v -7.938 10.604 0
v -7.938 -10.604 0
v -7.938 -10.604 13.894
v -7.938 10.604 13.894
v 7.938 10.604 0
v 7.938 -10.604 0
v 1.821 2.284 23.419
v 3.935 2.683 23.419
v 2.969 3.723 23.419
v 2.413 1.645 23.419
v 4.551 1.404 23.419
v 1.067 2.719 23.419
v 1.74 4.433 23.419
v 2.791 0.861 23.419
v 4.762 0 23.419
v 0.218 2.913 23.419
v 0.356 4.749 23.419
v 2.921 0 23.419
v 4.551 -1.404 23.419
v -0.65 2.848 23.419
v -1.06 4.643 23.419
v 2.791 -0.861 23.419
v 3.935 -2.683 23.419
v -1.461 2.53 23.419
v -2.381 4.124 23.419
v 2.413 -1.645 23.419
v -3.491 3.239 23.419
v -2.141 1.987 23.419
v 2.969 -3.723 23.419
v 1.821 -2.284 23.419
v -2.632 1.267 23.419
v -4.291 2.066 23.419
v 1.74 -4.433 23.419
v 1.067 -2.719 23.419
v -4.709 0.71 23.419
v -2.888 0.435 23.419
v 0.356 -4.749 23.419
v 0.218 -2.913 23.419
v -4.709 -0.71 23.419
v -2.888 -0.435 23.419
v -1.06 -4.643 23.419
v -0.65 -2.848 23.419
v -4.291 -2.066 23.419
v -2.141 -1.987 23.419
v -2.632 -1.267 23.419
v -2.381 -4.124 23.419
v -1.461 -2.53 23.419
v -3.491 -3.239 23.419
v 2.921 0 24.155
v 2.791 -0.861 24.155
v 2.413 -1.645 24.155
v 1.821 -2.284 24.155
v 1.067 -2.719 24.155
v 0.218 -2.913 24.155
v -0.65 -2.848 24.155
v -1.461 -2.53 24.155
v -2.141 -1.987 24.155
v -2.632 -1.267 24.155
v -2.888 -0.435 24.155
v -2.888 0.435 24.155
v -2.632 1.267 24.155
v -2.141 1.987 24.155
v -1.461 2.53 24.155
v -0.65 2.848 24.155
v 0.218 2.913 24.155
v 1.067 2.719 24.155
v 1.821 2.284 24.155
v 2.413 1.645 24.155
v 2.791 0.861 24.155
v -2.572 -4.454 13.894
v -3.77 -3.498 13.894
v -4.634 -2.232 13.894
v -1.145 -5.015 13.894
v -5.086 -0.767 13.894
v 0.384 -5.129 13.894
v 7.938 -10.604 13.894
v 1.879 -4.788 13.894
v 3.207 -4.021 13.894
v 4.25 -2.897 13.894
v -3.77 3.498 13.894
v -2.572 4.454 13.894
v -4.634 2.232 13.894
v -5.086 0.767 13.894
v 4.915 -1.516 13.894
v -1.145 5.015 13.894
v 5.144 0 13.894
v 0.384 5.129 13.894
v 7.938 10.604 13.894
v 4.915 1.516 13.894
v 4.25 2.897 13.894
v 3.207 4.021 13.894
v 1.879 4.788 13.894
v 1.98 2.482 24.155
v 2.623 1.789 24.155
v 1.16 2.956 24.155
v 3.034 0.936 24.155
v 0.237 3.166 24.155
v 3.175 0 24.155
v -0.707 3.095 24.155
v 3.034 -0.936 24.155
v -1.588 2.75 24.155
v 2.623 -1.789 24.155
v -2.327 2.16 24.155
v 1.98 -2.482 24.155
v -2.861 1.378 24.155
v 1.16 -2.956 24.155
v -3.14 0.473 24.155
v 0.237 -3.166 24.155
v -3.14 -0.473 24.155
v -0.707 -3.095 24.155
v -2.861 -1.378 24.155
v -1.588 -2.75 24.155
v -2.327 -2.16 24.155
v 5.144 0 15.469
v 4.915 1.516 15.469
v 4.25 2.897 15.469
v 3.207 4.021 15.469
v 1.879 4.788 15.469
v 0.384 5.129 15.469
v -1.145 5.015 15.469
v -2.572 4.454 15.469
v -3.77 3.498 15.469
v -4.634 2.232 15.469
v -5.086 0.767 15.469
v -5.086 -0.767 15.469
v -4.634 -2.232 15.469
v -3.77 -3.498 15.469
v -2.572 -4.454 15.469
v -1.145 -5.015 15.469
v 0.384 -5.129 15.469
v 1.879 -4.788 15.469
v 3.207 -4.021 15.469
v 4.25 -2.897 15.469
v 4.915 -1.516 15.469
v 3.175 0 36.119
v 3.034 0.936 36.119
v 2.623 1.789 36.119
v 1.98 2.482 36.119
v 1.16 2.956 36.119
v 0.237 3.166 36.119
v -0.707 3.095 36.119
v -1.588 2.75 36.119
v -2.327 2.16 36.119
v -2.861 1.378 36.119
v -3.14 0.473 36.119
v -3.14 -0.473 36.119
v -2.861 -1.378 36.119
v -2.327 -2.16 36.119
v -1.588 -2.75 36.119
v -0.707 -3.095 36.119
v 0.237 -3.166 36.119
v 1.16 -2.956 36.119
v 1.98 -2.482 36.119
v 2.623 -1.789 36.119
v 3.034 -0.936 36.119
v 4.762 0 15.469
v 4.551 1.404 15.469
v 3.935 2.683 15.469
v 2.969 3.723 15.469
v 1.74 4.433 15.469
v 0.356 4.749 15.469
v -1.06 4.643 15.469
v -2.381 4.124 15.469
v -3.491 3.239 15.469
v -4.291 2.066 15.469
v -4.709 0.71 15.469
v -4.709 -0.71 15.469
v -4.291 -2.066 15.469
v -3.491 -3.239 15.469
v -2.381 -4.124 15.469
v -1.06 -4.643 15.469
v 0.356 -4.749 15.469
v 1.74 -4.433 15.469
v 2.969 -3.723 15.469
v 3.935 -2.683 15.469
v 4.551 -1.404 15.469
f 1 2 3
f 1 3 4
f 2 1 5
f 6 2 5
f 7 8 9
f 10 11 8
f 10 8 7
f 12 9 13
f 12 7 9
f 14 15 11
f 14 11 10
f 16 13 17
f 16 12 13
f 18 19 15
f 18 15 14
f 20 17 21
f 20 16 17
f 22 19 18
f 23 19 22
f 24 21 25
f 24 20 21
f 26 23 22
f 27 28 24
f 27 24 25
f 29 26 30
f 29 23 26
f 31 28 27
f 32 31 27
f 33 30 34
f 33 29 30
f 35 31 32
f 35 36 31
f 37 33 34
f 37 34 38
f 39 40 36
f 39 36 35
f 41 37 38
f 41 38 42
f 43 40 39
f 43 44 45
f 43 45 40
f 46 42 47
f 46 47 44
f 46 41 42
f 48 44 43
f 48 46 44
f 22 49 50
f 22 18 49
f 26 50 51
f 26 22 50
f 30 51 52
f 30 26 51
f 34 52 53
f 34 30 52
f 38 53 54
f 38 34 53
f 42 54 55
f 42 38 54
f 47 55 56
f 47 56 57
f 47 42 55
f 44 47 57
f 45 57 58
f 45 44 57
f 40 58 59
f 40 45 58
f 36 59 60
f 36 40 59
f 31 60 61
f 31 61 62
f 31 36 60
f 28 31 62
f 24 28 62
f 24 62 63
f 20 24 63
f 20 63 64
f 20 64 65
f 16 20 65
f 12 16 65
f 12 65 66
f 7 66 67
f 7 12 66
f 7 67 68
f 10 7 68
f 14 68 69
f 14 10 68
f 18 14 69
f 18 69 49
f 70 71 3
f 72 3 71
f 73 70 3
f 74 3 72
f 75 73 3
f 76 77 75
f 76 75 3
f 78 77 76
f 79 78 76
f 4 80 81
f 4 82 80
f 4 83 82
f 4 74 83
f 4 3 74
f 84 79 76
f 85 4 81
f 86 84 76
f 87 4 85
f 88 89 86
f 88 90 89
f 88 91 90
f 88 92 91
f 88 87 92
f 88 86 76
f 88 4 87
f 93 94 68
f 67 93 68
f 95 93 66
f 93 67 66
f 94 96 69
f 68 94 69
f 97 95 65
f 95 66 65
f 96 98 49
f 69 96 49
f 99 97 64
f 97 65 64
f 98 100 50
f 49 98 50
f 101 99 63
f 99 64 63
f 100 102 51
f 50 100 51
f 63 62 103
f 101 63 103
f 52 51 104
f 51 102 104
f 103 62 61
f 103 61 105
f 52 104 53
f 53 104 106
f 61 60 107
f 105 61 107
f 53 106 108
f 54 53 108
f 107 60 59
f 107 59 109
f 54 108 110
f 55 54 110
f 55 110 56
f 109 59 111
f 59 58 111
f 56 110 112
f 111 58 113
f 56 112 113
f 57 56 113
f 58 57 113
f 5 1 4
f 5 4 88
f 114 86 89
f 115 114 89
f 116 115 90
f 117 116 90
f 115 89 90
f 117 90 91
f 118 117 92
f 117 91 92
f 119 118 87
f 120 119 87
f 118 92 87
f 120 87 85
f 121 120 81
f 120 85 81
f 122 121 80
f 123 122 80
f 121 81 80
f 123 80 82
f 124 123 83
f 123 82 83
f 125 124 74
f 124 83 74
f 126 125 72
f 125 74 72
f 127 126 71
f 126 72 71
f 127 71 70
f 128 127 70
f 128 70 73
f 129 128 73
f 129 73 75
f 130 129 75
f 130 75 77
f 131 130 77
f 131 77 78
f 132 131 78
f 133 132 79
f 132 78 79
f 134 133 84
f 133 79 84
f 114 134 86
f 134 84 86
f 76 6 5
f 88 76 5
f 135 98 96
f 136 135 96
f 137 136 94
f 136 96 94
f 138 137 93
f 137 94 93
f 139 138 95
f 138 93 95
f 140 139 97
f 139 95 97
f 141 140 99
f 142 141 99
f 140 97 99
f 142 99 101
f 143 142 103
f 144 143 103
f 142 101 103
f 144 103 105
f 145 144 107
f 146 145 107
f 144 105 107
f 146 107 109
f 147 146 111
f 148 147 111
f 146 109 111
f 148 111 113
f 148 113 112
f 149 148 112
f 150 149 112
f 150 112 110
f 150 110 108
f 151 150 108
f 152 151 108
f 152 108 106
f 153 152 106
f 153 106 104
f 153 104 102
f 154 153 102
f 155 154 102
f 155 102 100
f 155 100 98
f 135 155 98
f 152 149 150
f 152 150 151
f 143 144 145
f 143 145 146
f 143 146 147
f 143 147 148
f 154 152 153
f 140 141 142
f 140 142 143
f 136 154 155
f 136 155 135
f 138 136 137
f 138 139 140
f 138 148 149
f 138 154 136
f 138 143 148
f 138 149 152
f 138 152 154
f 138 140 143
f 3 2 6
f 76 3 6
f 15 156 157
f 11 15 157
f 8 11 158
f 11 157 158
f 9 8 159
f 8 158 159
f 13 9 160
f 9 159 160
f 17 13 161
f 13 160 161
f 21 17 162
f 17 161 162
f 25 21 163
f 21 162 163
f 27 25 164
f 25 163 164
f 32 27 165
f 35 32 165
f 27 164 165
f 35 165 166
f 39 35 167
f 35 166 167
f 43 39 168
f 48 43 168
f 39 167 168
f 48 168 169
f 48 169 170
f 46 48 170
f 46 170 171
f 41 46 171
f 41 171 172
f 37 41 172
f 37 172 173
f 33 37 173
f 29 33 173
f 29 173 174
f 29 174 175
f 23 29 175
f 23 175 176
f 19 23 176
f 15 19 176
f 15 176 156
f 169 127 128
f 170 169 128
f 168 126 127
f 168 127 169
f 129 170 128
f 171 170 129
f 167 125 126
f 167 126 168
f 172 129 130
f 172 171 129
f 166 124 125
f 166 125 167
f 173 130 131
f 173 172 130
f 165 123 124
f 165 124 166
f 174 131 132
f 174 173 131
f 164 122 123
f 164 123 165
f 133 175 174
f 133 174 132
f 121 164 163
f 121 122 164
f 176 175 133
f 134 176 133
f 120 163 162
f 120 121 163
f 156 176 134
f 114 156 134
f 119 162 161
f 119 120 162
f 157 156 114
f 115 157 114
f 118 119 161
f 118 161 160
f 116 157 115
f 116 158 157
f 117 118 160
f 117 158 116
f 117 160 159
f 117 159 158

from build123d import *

# Parameters (mm, degrees)
SKETCH1_W           = 15.875
SKETCH1_H           = 21.209
BOSS_EXTRUDE1_DEPTH = 13.8938
SKETCH2_R           = 5.1435
BOSS_EXTRUDE2_DEPTH = 1.5748
SKETCH3_R           = 4.7625
BOSS_EXTRUDE3_DEPTH = 9.525
SKETCH4_R           = 3.175
BOSS_EXTRUDE4_DEPTH = 22.225
SKETCH5_W           = 0.254
SKETCH5_H           = 0.7366


with BuildPart() as part:
    # Sketch1 → Boss-Extrude1 (new body)
    with BuildSketch(Plane.XY):
        Rectangle(SKETCH1_W, SKETCH1_H)
    extrude(amount=BOSS_EXTRUDE1_DEPTH)

    # Sketch2 → Boss-Extrude2 (add)
    with BuildSketch(Plane.XY.offset(13.8938)):
        Circle(SKETCH2_R)
    extrude(amount=BOSS_EXTRUDE2_DEPTH)

    # Sketch3 → Boss-Extrude3 (add)
    with BuildSketch(Plane.XY.offset(13.8938)):
        Circle(SKETCH3_R)
    extrude(amount=BOSS_EXTRUDE3_DEPTH)

    # Sketch4 → Boss-Extrude4 (add)
    with BuildSketch(Plane.XY.offset(13.8938)):
        Circle(SKETCH4_R)
    extrude(amount=BOSS_EXTRUDE4_DEPTH)

    # Sketch5 → Cut-Revolve1 (revolve, cut)
    with BuildSketch(Plane(origin=(0, 0, 0), x_dir=(1, 0, 0), z_dir=(0, 1, 0))):
        with Locations((3.048, -23.7871)):
            Rectangle(SKETCH5_W, SKETCH5_H)
    revolve(axis=Axis((0, 0, 36.1188), (0, 0, -1)), mode=Mode.SUBTRACT)


solid = part.part
